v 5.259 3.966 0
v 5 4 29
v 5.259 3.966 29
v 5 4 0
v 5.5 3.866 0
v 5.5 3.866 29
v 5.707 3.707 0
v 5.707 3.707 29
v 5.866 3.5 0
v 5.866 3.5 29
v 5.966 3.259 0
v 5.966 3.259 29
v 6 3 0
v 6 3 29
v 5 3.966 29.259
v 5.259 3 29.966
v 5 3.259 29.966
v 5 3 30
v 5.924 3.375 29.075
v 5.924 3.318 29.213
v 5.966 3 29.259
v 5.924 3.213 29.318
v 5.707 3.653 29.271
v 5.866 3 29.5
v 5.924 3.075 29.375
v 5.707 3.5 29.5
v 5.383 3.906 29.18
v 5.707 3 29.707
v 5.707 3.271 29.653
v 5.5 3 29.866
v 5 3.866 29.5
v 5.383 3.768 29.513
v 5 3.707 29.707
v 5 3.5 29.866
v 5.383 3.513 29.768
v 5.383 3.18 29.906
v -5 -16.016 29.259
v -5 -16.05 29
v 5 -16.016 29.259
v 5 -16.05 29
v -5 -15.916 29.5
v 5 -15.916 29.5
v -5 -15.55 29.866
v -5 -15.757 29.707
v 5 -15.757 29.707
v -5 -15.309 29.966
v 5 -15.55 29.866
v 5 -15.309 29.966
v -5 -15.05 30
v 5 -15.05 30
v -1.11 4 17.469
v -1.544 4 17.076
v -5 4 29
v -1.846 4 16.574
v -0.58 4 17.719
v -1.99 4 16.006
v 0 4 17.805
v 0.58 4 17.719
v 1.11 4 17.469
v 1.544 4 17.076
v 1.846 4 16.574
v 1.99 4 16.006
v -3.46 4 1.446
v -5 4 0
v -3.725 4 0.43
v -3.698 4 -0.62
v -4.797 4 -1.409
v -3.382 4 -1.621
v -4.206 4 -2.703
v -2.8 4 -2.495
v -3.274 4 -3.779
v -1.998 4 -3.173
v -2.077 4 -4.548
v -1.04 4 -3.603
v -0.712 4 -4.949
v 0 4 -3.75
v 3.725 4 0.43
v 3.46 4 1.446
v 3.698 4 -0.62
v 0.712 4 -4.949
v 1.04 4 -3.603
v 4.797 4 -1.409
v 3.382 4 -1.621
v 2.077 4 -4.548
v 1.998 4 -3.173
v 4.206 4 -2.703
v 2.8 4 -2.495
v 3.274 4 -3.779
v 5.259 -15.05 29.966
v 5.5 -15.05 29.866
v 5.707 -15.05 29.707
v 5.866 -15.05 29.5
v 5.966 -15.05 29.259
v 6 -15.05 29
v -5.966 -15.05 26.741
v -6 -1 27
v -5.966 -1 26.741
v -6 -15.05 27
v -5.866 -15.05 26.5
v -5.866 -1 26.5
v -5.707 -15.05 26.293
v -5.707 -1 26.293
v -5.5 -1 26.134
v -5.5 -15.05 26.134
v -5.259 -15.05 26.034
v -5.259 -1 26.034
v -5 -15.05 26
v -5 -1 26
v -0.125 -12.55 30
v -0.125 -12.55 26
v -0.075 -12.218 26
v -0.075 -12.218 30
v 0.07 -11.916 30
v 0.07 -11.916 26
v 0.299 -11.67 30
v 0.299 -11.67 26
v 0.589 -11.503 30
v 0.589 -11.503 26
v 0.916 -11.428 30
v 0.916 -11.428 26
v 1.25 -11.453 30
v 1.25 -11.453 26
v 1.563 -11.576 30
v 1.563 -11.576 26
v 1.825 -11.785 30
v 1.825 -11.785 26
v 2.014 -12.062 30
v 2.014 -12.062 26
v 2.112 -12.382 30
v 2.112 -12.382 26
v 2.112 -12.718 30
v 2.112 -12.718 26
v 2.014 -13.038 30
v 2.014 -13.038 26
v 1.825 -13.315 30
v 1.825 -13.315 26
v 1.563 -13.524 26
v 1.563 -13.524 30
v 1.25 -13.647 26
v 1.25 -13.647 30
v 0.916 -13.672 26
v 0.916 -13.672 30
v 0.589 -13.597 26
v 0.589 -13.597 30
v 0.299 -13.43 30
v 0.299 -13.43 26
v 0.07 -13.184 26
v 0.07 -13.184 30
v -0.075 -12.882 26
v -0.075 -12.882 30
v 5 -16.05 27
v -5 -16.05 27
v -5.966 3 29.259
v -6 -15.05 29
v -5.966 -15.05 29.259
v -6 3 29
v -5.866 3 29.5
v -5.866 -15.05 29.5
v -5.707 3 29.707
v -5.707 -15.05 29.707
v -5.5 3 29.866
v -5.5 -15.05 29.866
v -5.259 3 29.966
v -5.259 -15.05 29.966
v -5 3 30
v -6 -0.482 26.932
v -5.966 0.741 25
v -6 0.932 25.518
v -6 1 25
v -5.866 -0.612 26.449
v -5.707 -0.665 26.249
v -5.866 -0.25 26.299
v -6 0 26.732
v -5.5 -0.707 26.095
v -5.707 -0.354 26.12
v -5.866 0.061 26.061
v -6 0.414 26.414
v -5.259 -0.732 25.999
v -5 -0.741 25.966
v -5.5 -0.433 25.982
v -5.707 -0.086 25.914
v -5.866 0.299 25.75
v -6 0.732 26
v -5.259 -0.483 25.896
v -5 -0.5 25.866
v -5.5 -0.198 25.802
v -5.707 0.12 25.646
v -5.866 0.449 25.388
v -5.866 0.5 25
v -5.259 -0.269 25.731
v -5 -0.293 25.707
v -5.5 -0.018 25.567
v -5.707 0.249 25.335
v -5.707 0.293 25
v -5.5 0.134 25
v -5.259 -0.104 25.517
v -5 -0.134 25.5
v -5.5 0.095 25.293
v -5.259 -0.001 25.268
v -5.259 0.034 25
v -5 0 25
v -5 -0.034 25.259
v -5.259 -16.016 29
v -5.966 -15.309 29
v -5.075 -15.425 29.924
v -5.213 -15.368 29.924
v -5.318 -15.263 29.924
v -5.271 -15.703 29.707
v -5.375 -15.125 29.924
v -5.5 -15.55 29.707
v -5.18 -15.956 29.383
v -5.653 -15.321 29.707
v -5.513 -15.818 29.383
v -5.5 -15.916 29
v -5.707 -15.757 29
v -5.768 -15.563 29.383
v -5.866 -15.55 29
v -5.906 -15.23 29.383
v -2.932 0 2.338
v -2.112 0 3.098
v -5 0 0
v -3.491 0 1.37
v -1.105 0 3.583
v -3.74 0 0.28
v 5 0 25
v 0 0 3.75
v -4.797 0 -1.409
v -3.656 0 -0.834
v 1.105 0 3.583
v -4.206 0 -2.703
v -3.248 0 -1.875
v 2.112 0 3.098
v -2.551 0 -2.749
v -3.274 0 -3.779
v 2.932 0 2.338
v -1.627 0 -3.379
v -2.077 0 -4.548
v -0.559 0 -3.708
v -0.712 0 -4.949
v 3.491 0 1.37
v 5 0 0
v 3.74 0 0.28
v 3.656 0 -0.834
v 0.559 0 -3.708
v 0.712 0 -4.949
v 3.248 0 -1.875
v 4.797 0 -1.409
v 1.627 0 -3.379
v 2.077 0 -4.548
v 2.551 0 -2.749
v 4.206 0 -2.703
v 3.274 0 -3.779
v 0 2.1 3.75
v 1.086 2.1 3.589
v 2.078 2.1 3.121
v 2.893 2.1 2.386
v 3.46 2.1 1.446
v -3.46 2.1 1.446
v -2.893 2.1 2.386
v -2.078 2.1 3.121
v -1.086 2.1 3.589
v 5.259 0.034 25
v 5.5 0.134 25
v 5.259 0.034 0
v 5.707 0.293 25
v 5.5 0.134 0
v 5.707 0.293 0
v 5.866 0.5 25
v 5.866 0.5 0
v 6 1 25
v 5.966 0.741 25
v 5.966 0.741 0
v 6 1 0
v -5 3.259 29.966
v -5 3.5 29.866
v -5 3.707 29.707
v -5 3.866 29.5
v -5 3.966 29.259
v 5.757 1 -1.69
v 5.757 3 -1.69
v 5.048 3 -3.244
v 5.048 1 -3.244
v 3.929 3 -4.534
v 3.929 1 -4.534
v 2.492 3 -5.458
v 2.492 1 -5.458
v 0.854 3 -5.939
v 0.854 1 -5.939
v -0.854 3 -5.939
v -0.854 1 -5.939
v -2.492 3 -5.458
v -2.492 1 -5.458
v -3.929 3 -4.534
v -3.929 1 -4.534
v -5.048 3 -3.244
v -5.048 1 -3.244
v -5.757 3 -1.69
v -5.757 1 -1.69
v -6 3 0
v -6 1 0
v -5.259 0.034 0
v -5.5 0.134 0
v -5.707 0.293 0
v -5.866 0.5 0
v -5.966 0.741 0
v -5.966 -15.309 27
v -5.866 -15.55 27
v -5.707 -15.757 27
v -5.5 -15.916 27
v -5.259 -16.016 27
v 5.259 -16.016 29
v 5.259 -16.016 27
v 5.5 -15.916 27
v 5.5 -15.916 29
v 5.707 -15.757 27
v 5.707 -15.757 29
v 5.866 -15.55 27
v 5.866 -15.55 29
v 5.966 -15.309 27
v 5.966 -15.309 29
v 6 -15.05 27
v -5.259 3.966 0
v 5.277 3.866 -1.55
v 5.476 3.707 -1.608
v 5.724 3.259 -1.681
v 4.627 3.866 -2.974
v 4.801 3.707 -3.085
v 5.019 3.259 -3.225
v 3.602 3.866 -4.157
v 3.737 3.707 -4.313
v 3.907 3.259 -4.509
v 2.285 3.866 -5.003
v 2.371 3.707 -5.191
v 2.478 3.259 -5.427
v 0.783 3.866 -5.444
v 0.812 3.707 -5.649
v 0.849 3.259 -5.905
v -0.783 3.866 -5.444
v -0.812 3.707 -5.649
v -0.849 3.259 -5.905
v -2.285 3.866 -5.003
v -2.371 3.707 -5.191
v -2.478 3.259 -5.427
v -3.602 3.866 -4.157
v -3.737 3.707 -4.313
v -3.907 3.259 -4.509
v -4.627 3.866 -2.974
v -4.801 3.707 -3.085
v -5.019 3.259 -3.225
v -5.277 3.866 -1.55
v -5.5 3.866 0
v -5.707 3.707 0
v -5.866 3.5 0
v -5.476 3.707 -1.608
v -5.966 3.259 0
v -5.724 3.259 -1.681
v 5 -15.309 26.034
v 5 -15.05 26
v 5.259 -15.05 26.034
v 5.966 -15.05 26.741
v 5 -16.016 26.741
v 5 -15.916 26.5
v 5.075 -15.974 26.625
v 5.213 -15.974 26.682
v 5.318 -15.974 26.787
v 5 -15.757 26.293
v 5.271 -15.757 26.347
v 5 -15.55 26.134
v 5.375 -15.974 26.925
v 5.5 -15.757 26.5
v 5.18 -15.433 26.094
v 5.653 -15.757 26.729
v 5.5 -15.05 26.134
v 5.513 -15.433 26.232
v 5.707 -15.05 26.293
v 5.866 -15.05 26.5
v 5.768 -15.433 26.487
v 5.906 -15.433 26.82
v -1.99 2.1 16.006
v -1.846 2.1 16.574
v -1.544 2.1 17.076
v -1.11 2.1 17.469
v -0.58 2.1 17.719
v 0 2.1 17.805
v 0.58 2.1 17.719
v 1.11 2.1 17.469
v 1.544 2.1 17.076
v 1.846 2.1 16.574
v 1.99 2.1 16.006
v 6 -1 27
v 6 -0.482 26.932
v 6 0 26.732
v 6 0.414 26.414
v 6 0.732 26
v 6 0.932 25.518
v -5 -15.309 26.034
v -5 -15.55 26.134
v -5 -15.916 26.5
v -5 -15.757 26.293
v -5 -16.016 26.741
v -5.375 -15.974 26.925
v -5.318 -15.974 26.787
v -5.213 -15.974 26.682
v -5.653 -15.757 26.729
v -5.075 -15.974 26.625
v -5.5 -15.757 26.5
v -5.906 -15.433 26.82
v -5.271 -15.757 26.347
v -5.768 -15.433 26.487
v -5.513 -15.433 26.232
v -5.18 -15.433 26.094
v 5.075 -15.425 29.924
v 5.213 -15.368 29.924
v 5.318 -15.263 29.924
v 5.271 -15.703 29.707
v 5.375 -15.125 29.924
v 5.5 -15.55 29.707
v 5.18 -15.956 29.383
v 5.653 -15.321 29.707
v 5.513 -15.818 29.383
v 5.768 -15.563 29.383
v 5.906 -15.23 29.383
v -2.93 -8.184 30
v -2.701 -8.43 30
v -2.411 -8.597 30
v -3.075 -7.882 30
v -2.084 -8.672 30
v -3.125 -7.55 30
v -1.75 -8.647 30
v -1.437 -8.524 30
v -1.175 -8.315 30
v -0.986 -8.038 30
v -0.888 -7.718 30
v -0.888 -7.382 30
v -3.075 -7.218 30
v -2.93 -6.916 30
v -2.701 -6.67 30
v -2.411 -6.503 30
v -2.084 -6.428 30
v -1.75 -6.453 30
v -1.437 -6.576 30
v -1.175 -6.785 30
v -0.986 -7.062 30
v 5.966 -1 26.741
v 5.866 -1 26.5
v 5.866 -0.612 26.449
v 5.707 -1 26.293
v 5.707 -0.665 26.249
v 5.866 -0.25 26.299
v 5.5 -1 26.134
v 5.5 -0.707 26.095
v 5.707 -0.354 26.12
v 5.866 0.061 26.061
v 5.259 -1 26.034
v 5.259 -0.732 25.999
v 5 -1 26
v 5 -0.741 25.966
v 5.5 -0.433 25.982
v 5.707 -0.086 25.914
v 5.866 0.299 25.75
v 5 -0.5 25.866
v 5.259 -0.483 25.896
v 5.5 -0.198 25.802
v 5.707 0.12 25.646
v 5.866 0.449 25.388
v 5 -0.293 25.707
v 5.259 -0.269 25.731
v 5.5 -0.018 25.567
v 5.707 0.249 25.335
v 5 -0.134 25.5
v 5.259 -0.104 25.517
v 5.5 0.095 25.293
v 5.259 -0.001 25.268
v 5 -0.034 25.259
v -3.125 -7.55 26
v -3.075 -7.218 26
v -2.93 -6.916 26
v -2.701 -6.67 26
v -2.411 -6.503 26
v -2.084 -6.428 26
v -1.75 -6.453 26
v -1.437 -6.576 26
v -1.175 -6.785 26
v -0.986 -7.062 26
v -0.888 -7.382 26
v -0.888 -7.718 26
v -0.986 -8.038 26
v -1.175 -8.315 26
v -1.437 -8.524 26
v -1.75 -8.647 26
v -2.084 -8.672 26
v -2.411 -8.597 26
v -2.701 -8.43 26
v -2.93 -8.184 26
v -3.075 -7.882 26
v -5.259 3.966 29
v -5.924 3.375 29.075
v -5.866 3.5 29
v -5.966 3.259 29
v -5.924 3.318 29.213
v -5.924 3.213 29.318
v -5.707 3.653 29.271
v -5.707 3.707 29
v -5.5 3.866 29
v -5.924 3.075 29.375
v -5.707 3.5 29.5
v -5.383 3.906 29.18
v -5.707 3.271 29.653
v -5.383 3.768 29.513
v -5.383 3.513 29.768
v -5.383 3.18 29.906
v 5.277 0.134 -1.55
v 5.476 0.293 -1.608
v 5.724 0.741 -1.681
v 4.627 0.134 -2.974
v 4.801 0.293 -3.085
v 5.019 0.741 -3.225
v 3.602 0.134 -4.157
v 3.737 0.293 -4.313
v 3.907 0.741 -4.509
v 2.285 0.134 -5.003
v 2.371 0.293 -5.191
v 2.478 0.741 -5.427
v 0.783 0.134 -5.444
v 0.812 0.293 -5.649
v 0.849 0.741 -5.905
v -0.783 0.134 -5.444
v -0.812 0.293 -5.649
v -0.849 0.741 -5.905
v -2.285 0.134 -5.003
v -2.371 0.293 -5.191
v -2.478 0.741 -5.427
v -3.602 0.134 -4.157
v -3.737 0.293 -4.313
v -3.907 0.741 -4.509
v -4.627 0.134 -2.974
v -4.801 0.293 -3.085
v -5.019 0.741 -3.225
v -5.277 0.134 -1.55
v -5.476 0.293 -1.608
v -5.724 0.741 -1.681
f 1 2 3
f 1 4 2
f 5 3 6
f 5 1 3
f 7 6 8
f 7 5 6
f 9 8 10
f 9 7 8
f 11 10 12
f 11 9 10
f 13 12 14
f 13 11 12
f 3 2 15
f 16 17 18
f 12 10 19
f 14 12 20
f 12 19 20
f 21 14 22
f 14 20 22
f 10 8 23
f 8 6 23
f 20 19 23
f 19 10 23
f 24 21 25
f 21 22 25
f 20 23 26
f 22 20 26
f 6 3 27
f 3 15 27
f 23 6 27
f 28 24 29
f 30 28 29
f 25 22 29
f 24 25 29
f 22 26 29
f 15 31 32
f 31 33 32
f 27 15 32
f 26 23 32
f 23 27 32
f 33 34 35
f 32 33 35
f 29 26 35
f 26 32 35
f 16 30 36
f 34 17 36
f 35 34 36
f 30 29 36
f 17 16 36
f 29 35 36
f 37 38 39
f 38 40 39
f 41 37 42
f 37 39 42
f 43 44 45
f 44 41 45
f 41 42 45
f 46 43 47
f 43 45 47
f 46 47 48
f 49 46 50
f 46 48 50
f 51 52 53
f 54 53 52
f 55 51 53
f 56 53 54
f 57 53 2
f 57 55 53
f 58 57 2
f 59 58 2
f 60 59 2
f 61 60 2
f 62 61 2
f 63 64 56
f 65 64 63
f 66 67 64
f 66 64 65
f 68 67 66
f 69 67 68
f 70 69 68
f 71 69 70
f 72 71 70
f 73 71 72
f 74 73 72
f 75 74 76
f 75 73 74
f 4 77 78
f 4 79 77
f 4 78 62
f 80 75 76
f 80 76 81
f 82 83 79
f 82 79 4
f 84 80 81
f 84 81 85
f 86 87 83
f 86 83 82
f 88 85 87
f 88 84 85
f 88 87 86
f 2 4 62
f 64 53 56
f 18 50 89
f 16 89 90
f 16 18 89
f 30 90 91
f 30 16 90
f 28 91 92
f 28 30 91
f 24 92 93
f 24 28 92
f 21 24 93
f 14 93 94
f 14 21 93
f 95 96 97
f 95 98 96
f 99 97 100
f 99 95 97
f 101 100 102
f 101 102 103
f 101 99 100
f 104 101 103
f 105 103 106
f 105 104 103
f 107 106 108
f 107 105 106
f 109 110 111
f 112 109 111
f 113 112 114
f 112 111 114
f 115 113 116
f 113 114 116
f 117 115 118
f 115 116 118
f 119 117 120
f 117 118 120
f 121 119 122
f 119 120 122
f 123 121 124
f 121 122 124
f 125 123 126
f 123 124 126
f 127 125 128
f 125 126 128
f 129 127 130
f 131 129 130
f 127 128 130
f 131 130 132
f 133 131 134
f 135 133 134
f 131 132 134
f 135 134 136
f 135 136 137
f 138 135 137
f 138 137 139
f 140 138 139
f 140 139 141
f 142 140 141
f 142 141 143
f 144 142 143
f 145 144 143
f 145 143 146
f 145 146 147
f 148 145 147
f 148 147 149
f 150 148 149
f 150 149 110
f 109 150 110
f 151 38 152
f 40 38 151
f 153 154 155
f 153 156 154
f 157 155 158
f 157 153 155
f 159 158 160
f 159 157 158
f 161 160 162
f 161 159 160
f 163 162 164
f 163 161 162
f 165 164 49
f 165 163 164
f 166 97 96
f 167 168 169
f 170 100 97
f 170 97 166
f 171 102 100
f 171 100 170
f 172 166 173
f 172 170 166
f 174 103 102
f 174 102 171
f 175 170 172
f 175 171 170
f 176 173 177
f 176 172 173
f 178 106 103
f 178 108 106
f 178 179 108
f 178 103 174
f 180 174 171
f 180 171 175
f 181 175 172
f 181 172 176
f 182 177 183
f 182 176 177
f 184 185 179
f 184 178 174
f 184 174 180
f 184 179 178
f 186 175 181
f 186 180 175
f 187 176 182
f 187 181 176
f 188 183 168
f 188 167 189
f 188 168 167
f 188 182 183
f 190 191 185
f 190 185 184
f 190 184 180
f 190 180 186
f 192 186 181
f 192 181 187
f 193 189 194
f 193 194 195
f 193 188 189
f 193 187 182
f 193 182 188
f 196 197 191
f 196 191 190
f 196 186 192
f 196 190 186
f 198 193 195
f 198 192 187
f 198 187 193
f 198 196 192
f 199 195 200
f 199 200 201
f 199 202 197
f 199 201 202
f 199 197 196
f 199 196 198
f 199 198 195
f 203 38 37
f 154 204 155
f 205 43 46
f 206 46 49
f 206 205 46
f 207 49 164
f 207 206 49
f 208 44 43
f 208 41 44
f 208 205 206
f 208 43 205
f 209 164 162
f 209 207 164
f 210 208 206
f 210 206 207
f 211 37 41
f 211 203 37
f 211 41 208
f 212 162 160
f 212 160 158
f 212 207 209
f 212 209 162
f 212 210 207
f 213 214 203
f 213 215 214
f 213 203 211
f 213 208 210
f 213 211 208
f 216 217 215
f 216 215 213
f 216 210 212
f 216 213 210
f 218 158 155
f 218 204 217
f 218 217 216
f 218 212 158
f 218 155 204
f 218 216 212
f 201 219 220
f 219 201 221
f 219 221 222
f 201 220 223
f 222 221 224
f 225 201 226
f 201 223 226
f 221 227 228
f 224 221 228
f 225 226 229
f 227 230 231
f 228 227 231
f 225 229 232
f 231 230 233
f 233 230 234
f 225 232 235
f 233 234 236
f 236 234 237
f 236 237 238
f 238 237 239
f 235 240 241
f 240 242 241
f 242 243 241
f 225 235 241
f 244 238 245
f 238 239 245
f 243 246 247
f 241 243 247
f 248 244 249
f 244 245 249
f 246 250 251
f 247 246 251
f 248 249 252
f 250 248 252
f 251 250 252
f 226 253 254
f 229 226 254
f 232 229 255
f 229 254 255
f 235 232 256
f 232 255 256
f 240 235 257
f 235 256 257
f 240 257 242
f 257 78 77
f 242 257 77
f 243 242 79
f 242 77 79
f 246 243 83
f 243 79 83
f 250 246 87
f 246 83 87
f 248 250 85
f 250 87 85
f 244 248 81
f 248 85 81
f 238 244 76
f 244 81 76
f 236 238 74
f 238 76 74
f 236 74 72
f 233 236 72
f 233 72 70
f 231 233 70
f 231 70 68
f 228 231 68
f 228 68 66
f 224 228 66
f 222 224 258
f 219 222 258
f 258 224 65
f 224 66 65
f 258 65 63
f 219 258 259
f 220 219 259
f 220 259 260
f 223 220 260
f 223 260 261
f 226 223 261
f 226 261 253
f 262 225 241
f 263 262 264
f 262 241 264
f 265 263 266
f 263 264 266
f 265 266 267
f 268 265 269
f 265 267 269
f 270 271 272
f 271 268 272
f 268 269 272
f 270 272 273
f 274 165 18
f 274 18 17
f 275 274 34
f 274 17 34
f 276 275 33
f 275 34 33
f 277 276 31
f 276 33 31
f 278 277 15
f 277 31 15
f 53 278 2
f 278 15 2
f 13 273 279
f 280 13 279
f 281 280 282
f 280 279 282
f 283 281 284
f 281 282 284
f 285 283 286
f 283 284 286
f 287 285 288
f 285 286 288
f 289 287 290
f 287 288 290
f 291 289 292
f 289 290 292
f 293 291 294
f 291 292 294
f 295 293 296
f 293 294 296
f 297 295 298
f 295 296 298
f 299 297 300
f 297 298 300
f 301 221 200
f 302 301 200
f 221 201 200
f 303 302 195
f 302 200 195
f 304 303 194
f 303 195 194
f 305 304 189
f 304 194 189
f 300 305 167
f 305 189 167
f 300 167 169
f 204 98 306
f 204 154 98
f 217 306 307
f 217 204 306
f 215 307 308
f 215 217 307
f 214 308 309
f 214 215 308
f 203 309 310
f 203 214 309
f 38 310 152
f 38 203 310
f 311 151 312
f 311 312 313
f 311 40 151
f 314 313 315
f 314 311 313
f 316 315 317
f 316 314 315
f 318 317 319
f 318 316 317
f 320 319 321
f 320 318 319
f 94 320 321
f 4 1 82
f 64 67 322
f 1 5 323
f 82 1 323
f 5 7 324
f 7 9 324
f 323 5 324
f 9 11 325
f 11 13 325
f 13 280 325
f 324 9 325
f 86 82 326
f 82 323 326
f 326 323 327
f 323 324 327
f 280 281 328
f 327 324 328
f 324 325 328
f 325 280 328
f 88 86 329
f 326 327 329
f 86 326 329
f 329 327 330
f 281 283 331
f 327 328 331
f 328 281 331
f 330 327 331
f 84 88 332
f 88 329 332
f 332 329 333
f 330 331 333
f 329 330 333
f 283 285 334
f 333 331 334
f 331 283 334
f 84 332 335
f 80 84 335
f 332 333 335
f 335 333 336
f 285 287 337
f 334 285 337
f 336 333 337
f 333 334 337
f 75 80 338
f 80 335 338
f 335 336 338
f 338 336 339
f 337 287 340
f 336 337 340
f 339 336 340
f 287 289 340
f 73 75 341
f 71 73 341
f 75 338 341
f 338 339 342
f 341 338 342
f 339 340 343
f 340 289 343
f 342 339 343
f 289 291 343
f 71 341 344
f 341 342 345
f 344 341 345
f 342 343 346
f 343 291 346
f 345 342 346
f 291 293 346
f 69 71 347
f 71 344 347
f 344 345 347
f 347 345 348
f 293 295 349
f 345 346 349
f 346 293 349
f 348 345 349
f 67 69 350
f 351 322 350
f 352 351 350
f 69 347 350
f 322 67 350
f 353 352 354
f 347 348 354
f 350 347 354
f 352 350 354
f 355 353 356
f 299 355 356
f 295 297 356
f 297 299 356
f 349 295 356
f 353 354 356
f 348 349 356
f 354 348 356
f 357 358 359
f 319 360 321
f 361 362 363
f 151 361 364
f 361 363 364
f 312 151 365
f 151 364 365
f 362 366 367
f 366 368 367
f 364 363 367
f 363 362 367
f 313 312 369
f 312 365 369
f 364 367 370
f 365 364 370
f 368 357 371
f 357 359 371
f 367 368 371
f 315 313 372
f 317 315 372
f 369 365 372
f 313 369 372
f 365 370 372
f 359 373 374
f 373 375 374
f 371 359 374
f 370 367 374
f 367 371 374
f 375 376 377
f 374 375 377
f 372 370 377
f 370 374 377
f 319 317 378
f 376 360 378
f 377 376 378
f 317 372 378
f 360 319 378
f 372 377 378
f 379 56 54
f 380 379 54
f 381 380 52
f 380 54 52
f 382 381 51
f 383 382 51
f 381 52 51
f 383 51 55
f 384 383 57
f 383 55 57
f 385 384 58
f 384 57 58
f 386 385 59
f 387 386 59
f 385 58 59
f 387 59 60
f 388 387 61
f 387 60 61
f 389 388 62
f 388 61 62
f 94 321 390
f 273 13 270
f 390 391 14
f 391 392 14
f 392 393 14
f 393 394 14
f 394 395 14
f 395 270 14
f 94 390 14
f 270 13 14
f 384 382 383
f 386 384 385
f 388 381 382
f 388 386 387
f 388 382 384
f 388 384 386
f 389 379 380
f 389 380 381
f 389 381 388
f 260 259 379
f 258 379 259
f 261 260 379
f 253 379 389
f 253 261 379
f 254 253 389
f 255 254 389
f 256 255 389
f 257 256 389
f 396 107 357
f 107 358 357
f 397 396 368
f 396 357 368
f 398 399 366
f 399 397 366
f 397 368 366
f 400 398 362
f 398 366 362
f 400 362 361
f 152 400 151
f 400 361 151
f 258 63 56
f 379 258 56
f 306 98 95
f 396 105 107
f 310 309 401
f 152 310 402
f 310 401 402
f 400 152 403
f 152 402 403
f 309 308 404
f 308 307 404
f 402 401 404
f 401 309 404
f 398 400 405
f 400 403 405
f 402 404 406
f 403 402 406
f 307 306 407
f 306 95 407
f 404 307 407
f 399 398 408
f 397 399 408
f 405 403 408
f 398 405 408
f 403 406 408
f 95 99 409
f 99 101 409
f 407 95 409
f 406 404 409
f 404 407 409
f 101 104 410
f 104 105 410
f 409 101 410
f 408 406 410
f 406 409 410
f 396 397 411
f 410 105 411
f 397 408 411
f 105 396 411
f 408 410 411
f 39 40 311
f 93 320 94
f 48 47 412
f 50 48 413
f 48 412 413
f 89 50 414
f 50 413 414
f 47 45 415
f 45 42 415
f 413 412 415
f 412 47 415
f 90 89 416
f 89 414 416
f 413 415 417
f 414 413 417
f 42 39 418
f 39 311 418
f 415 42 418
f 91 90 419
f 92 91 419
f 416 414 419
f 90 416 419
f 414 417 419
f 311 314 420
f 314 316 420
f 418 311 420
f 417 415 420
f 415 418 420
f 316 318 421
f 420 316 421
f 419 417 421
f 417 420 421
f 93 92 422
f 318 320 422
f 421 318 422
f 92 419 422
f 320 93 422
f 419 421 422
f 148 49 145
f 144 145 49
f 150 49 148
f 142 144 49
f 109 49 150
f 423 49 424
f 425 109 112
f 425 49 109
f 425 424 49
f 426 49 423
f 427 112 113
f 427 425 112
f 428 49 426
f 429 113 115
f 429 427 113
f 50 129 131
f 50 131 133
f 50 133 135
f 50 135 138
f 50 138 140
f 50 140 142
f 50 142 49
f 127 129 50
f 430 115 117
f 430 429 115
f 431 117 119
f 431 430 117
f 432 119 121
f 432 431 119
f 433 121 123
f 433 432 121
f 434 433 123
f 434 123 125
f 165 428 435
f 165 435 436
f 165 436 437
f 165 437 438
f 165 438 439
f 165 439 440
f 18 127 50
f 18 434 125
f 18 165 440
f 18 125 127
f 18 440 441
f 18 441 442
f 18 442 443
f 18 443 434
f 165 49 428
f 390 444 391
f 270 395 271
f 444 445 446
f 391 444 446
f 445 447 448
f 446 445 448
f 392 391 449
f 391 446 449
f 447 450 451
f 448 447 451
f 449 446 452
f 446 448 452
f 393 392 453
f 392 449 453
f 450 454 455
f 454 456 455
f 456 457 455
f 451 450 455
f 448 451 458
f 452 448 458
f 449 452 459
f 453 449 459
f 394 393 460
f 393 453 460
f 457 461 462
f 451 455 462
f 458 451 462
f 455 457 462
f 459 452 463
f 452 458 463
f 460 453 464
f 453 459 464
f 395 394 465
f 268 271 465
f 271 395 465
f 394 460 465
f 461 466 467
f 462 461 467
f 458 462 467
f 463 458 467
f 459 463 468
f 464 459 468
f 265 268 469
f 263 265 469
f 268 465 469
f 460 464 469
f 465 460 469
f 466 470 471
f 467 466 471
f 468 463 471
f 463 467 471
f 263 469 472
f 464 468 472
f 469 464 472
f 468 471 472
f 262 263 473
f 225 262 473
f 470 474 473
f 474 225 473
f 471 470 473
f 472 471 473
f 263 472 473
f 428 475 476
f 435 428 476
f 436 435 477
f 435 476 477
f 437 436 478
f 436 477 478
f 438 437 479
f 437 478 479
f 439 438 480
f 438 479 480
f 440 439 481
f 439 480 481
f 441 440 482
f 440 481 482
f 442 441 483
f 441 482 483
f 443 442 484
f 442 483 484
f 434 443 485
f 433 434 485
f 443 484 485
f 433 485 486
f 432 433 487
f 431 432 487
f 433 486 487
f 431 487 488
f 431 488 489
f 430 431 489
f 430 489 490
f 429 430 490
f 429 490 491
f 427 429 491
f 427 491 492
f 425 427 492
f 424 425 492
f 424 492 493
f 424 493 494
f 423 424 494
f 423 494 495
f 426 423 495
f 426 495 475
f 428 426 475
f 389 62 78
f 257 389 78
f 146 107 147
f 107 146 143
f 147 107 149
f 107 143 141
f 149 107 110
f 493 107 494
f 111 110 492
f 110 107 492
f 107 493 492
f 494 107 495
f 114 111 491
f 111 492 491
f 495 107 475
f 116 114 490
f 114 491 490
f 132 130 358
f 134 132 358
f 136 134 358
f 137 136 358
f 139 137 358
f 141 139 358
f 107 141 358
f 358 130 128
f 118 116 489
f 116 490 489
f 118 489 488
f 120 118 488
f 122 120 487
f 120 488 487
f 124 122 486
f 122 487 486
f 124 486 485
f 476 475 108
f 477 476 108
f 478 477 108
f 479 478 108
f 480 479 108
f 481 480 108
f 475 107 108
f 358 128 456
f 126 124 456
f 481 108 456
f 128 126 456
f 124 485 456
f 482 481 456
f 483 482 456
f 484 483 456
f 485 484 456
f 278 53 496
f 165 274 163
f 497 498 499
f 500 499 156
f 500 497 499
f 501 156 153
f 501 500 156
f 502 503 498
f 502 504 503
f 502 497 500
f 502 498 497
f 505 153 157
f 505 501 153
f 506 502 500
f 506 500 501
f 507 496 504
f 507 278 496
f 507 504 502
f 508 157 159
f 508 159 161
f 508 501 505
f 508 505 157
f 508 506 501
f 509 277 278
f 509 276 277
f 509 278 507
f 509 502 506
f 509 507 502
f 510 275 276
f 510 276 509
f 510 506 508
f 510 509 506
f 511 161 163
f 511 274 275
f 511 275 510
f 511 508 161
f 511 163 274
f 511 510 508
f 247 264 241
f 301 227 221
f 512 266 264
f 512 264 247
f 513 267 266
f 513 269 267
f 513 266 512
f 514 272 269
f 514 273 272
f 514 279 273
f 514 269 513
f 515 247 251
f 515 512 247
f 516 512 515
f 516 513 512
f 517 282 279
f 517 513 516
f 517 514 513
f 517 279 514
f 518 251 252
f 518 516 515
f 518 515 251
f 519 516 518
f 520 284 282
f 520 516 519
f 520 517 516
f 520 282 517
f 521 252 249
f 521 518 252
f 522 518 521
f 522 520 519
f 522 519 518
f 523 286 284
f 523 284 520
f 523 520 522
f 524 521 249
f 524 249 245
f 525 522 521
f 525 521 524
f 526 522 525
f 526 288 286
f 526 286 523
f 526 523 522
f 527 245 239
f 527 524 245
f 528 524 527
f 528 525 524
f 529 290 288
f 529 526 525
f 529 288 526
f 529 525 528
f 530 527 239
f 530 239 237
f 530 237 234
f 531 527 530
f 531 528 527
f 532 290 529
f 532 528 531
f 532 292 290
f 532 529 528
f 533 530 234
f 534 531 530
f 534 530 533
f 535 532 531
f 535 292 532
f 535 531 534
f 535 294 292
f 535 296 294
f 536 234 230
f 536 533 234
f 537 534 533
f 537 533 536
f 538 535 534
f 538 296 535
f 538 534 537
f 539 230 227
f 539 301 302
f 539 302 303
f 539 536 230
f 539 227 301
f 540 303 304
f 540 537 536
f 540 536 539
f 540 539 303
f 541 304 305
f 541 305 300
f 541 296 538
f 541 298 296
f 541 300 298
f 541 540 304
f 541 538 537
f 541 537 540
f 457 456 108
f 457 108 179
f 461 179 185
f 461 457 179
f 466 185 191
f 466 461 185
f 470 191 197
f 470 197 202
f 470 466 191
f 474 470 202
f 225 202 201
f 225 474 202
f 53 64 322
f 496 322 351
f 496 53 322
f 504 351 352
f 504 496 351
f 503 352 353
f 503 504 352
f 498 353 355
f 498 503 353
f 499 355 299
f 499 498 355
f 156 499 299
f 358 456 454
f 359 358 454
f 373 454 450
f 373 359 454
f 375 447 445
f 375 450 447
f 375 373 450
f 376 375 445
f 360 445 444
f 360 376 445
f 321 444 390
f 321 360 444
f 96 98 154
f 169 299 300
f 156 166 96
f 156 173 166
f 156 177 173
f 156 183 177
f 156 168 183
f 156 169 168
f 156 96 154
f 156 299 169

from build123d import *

# Parameters (mm, degrees)
PITCH_ARM_BASE_DEPTH          = 4
PITCH_ARM_MOUNTING_HOLE_REACH = 32.854
SKETCH2_R                     = 3.75
PITCH_ARM_SLOT_DEPTH          = 1.9
SKETCH5_W                     = 12
SKETCH5_H                     = 4
MOUNTING_BRACKET_DEPTH        = 16.05
BRACKET_MOUNTING_HOLES_REACH  = 38.299
SKETCH8_R                     = 1.125
F_1MM_FILLETS_R               = 1


with BuildPart() as part:
    # Sketch1 → Pitch Arm Base (new body)
    with BuildSketch(Plane(origin=(0, 0, 0), x_dir=(1, 0, 0), z_dir=(0, 1, 0))):
        with BuildLine():
            Line((-6, 0), (-6, -30))
            Line((-6, -30), (6, -30))
            Line((6, -30), (6, 0))
            ThreePointArc((6, 0), (0, 6), (-6, 0))
        make_face()
    extrude(amount=PITCH_ARM_BASE_DEPTH)

    # Sketch2 → Pitch Arm Mounting Hole (cut, up to next)
    with BuildSketch(Plane(origin=(0, 4, 0), x_dir=(1, 0, 0), z_dir=(0, 1, 0)), mode=Mode.PRIVATE) as pitch_arm_mounting_hole_sk1:
        with Locations(Location((0, 0, 0), (0, 0, 270))):
            Circle(SKETCH2_R)
    pitch_arm_mounting_hole_tool1 = extrude(pitch_arm_mounting_hole_sk1.sketch, amount=-PITCH_ARM_MOUNTING_HOLE_REACH, mode=Mode.PRIVATE) & part.part
    add(pitch_arm_mounting_hole_tool1.solids().sort_by_distance((0, 4, 0))[0], mode=Mode.SUBTRACT)

    # Sketch4 → Pitch Arm Slot (cut)
    with BuildSketch(Plane(origin=(0, 4, 0), x_dir=(1, 0, 0), z_dir=(0, 1, 0))):
        with BuildLine():
            Line((-3.46, -1.445994467), (-1.989882432, -16.005994467))
            ThreePointArc((-1.989882432, -16.005994467), (0, -17.805076808), (1.989882432, -16.005994467))
            Line((1.989882432, -16.005994467), (3.46, -1.445994467))
            ThreePointArc((3.46, -1.445994467), (0, -3.75), (-3.46, -1.445994467))
        make_face()
    extrude(amount=-PITCH_ARM_SLOT_DEPTH, mode=Mode.SUBTRACT)

    # Sketch5 → Mounting Bracket (add)
    with BuildSketch(Plane.XZ):
        with Locations((0, 28)):
            Rectangle(SKETCH5_W, SKETCH5_H)
    extrude(amount=MOUNTING_BRACKET_DEPTH)

    # Sketch8 → Bracket Mounting Holes (cut, up to next)
    with BuildSketch(Plane(origin=(0, 0, 26), x_dir=(-1, 0, 0), z_dir=(0, 0, -1)), mode=Mode.PRIVATE) as bracket_mounting_holes_sk1:
        with Locations((-1, -12.55)):
            Circle(SKETCH8_R)
    bracket_mounting_holes_tool1 = extrude(bracket_mounting_holes_sk1.sketch, amount=-BRACKET_MOUNTING_HOLES_REACH, mode=Mode.PRIVATE) & part.part
    # Sketch8 → Bracket Mounting Holes (cut, up to next)
    with BuildSketch(Plane(origin=(0, 0, 26), x_dir=(-1, 0, 0), z_dir=(0, 0, -1)), mode=Mode.PRIVATE) as bracket_mounting_holes_sk2:
        with Locations((2, -7.55)):
            Circle(SKETCH8_R)
    bracket_mounting_holes_tool2 = extrude(bracket_mounting_holes_sk2.sketch, amount=-BRACKET_MOUNTING_HOLES_REACH, mode=Mode.PRIVATE) & part.part
    add(bracket_mounting_holes_tool1.solids().sort_by_distance((1, -12.55, 26))[0], mode=Mode.SUBTRACT)
    add(bracket_mounting_holes_tool2.solids().sort_by_distance((-2, -7.55, 26))[0], mode=Mode.SUBTRACT)

    # 1mm Fillets
    f_1mm_fillets_edges = [part.edges().sort_by_distance(p)[0] for p in [
        (0, 4, 30),
        (6, 4, 15),
        (6, 0, 13),
        (0, 0, 26),
        (-6, -8.025, 26),
        (6, -8.025, 26),
        (-6, -16.05, 28),
        (0, -16.05, 26),
        (6, -16.05, 28),
        (0, -16.05, 30),
        (0, 4, -6),
        (-6, 0, 13),
        (0, 0, -6),
        (6, -6.025, 30),
        (-6, -6.025, 30),
        (-6, 4, 15),
    ]]
    fillet(f_1mm_fillets_edges, radius=F_1MM_FILLETS_R)


solid = part.part
